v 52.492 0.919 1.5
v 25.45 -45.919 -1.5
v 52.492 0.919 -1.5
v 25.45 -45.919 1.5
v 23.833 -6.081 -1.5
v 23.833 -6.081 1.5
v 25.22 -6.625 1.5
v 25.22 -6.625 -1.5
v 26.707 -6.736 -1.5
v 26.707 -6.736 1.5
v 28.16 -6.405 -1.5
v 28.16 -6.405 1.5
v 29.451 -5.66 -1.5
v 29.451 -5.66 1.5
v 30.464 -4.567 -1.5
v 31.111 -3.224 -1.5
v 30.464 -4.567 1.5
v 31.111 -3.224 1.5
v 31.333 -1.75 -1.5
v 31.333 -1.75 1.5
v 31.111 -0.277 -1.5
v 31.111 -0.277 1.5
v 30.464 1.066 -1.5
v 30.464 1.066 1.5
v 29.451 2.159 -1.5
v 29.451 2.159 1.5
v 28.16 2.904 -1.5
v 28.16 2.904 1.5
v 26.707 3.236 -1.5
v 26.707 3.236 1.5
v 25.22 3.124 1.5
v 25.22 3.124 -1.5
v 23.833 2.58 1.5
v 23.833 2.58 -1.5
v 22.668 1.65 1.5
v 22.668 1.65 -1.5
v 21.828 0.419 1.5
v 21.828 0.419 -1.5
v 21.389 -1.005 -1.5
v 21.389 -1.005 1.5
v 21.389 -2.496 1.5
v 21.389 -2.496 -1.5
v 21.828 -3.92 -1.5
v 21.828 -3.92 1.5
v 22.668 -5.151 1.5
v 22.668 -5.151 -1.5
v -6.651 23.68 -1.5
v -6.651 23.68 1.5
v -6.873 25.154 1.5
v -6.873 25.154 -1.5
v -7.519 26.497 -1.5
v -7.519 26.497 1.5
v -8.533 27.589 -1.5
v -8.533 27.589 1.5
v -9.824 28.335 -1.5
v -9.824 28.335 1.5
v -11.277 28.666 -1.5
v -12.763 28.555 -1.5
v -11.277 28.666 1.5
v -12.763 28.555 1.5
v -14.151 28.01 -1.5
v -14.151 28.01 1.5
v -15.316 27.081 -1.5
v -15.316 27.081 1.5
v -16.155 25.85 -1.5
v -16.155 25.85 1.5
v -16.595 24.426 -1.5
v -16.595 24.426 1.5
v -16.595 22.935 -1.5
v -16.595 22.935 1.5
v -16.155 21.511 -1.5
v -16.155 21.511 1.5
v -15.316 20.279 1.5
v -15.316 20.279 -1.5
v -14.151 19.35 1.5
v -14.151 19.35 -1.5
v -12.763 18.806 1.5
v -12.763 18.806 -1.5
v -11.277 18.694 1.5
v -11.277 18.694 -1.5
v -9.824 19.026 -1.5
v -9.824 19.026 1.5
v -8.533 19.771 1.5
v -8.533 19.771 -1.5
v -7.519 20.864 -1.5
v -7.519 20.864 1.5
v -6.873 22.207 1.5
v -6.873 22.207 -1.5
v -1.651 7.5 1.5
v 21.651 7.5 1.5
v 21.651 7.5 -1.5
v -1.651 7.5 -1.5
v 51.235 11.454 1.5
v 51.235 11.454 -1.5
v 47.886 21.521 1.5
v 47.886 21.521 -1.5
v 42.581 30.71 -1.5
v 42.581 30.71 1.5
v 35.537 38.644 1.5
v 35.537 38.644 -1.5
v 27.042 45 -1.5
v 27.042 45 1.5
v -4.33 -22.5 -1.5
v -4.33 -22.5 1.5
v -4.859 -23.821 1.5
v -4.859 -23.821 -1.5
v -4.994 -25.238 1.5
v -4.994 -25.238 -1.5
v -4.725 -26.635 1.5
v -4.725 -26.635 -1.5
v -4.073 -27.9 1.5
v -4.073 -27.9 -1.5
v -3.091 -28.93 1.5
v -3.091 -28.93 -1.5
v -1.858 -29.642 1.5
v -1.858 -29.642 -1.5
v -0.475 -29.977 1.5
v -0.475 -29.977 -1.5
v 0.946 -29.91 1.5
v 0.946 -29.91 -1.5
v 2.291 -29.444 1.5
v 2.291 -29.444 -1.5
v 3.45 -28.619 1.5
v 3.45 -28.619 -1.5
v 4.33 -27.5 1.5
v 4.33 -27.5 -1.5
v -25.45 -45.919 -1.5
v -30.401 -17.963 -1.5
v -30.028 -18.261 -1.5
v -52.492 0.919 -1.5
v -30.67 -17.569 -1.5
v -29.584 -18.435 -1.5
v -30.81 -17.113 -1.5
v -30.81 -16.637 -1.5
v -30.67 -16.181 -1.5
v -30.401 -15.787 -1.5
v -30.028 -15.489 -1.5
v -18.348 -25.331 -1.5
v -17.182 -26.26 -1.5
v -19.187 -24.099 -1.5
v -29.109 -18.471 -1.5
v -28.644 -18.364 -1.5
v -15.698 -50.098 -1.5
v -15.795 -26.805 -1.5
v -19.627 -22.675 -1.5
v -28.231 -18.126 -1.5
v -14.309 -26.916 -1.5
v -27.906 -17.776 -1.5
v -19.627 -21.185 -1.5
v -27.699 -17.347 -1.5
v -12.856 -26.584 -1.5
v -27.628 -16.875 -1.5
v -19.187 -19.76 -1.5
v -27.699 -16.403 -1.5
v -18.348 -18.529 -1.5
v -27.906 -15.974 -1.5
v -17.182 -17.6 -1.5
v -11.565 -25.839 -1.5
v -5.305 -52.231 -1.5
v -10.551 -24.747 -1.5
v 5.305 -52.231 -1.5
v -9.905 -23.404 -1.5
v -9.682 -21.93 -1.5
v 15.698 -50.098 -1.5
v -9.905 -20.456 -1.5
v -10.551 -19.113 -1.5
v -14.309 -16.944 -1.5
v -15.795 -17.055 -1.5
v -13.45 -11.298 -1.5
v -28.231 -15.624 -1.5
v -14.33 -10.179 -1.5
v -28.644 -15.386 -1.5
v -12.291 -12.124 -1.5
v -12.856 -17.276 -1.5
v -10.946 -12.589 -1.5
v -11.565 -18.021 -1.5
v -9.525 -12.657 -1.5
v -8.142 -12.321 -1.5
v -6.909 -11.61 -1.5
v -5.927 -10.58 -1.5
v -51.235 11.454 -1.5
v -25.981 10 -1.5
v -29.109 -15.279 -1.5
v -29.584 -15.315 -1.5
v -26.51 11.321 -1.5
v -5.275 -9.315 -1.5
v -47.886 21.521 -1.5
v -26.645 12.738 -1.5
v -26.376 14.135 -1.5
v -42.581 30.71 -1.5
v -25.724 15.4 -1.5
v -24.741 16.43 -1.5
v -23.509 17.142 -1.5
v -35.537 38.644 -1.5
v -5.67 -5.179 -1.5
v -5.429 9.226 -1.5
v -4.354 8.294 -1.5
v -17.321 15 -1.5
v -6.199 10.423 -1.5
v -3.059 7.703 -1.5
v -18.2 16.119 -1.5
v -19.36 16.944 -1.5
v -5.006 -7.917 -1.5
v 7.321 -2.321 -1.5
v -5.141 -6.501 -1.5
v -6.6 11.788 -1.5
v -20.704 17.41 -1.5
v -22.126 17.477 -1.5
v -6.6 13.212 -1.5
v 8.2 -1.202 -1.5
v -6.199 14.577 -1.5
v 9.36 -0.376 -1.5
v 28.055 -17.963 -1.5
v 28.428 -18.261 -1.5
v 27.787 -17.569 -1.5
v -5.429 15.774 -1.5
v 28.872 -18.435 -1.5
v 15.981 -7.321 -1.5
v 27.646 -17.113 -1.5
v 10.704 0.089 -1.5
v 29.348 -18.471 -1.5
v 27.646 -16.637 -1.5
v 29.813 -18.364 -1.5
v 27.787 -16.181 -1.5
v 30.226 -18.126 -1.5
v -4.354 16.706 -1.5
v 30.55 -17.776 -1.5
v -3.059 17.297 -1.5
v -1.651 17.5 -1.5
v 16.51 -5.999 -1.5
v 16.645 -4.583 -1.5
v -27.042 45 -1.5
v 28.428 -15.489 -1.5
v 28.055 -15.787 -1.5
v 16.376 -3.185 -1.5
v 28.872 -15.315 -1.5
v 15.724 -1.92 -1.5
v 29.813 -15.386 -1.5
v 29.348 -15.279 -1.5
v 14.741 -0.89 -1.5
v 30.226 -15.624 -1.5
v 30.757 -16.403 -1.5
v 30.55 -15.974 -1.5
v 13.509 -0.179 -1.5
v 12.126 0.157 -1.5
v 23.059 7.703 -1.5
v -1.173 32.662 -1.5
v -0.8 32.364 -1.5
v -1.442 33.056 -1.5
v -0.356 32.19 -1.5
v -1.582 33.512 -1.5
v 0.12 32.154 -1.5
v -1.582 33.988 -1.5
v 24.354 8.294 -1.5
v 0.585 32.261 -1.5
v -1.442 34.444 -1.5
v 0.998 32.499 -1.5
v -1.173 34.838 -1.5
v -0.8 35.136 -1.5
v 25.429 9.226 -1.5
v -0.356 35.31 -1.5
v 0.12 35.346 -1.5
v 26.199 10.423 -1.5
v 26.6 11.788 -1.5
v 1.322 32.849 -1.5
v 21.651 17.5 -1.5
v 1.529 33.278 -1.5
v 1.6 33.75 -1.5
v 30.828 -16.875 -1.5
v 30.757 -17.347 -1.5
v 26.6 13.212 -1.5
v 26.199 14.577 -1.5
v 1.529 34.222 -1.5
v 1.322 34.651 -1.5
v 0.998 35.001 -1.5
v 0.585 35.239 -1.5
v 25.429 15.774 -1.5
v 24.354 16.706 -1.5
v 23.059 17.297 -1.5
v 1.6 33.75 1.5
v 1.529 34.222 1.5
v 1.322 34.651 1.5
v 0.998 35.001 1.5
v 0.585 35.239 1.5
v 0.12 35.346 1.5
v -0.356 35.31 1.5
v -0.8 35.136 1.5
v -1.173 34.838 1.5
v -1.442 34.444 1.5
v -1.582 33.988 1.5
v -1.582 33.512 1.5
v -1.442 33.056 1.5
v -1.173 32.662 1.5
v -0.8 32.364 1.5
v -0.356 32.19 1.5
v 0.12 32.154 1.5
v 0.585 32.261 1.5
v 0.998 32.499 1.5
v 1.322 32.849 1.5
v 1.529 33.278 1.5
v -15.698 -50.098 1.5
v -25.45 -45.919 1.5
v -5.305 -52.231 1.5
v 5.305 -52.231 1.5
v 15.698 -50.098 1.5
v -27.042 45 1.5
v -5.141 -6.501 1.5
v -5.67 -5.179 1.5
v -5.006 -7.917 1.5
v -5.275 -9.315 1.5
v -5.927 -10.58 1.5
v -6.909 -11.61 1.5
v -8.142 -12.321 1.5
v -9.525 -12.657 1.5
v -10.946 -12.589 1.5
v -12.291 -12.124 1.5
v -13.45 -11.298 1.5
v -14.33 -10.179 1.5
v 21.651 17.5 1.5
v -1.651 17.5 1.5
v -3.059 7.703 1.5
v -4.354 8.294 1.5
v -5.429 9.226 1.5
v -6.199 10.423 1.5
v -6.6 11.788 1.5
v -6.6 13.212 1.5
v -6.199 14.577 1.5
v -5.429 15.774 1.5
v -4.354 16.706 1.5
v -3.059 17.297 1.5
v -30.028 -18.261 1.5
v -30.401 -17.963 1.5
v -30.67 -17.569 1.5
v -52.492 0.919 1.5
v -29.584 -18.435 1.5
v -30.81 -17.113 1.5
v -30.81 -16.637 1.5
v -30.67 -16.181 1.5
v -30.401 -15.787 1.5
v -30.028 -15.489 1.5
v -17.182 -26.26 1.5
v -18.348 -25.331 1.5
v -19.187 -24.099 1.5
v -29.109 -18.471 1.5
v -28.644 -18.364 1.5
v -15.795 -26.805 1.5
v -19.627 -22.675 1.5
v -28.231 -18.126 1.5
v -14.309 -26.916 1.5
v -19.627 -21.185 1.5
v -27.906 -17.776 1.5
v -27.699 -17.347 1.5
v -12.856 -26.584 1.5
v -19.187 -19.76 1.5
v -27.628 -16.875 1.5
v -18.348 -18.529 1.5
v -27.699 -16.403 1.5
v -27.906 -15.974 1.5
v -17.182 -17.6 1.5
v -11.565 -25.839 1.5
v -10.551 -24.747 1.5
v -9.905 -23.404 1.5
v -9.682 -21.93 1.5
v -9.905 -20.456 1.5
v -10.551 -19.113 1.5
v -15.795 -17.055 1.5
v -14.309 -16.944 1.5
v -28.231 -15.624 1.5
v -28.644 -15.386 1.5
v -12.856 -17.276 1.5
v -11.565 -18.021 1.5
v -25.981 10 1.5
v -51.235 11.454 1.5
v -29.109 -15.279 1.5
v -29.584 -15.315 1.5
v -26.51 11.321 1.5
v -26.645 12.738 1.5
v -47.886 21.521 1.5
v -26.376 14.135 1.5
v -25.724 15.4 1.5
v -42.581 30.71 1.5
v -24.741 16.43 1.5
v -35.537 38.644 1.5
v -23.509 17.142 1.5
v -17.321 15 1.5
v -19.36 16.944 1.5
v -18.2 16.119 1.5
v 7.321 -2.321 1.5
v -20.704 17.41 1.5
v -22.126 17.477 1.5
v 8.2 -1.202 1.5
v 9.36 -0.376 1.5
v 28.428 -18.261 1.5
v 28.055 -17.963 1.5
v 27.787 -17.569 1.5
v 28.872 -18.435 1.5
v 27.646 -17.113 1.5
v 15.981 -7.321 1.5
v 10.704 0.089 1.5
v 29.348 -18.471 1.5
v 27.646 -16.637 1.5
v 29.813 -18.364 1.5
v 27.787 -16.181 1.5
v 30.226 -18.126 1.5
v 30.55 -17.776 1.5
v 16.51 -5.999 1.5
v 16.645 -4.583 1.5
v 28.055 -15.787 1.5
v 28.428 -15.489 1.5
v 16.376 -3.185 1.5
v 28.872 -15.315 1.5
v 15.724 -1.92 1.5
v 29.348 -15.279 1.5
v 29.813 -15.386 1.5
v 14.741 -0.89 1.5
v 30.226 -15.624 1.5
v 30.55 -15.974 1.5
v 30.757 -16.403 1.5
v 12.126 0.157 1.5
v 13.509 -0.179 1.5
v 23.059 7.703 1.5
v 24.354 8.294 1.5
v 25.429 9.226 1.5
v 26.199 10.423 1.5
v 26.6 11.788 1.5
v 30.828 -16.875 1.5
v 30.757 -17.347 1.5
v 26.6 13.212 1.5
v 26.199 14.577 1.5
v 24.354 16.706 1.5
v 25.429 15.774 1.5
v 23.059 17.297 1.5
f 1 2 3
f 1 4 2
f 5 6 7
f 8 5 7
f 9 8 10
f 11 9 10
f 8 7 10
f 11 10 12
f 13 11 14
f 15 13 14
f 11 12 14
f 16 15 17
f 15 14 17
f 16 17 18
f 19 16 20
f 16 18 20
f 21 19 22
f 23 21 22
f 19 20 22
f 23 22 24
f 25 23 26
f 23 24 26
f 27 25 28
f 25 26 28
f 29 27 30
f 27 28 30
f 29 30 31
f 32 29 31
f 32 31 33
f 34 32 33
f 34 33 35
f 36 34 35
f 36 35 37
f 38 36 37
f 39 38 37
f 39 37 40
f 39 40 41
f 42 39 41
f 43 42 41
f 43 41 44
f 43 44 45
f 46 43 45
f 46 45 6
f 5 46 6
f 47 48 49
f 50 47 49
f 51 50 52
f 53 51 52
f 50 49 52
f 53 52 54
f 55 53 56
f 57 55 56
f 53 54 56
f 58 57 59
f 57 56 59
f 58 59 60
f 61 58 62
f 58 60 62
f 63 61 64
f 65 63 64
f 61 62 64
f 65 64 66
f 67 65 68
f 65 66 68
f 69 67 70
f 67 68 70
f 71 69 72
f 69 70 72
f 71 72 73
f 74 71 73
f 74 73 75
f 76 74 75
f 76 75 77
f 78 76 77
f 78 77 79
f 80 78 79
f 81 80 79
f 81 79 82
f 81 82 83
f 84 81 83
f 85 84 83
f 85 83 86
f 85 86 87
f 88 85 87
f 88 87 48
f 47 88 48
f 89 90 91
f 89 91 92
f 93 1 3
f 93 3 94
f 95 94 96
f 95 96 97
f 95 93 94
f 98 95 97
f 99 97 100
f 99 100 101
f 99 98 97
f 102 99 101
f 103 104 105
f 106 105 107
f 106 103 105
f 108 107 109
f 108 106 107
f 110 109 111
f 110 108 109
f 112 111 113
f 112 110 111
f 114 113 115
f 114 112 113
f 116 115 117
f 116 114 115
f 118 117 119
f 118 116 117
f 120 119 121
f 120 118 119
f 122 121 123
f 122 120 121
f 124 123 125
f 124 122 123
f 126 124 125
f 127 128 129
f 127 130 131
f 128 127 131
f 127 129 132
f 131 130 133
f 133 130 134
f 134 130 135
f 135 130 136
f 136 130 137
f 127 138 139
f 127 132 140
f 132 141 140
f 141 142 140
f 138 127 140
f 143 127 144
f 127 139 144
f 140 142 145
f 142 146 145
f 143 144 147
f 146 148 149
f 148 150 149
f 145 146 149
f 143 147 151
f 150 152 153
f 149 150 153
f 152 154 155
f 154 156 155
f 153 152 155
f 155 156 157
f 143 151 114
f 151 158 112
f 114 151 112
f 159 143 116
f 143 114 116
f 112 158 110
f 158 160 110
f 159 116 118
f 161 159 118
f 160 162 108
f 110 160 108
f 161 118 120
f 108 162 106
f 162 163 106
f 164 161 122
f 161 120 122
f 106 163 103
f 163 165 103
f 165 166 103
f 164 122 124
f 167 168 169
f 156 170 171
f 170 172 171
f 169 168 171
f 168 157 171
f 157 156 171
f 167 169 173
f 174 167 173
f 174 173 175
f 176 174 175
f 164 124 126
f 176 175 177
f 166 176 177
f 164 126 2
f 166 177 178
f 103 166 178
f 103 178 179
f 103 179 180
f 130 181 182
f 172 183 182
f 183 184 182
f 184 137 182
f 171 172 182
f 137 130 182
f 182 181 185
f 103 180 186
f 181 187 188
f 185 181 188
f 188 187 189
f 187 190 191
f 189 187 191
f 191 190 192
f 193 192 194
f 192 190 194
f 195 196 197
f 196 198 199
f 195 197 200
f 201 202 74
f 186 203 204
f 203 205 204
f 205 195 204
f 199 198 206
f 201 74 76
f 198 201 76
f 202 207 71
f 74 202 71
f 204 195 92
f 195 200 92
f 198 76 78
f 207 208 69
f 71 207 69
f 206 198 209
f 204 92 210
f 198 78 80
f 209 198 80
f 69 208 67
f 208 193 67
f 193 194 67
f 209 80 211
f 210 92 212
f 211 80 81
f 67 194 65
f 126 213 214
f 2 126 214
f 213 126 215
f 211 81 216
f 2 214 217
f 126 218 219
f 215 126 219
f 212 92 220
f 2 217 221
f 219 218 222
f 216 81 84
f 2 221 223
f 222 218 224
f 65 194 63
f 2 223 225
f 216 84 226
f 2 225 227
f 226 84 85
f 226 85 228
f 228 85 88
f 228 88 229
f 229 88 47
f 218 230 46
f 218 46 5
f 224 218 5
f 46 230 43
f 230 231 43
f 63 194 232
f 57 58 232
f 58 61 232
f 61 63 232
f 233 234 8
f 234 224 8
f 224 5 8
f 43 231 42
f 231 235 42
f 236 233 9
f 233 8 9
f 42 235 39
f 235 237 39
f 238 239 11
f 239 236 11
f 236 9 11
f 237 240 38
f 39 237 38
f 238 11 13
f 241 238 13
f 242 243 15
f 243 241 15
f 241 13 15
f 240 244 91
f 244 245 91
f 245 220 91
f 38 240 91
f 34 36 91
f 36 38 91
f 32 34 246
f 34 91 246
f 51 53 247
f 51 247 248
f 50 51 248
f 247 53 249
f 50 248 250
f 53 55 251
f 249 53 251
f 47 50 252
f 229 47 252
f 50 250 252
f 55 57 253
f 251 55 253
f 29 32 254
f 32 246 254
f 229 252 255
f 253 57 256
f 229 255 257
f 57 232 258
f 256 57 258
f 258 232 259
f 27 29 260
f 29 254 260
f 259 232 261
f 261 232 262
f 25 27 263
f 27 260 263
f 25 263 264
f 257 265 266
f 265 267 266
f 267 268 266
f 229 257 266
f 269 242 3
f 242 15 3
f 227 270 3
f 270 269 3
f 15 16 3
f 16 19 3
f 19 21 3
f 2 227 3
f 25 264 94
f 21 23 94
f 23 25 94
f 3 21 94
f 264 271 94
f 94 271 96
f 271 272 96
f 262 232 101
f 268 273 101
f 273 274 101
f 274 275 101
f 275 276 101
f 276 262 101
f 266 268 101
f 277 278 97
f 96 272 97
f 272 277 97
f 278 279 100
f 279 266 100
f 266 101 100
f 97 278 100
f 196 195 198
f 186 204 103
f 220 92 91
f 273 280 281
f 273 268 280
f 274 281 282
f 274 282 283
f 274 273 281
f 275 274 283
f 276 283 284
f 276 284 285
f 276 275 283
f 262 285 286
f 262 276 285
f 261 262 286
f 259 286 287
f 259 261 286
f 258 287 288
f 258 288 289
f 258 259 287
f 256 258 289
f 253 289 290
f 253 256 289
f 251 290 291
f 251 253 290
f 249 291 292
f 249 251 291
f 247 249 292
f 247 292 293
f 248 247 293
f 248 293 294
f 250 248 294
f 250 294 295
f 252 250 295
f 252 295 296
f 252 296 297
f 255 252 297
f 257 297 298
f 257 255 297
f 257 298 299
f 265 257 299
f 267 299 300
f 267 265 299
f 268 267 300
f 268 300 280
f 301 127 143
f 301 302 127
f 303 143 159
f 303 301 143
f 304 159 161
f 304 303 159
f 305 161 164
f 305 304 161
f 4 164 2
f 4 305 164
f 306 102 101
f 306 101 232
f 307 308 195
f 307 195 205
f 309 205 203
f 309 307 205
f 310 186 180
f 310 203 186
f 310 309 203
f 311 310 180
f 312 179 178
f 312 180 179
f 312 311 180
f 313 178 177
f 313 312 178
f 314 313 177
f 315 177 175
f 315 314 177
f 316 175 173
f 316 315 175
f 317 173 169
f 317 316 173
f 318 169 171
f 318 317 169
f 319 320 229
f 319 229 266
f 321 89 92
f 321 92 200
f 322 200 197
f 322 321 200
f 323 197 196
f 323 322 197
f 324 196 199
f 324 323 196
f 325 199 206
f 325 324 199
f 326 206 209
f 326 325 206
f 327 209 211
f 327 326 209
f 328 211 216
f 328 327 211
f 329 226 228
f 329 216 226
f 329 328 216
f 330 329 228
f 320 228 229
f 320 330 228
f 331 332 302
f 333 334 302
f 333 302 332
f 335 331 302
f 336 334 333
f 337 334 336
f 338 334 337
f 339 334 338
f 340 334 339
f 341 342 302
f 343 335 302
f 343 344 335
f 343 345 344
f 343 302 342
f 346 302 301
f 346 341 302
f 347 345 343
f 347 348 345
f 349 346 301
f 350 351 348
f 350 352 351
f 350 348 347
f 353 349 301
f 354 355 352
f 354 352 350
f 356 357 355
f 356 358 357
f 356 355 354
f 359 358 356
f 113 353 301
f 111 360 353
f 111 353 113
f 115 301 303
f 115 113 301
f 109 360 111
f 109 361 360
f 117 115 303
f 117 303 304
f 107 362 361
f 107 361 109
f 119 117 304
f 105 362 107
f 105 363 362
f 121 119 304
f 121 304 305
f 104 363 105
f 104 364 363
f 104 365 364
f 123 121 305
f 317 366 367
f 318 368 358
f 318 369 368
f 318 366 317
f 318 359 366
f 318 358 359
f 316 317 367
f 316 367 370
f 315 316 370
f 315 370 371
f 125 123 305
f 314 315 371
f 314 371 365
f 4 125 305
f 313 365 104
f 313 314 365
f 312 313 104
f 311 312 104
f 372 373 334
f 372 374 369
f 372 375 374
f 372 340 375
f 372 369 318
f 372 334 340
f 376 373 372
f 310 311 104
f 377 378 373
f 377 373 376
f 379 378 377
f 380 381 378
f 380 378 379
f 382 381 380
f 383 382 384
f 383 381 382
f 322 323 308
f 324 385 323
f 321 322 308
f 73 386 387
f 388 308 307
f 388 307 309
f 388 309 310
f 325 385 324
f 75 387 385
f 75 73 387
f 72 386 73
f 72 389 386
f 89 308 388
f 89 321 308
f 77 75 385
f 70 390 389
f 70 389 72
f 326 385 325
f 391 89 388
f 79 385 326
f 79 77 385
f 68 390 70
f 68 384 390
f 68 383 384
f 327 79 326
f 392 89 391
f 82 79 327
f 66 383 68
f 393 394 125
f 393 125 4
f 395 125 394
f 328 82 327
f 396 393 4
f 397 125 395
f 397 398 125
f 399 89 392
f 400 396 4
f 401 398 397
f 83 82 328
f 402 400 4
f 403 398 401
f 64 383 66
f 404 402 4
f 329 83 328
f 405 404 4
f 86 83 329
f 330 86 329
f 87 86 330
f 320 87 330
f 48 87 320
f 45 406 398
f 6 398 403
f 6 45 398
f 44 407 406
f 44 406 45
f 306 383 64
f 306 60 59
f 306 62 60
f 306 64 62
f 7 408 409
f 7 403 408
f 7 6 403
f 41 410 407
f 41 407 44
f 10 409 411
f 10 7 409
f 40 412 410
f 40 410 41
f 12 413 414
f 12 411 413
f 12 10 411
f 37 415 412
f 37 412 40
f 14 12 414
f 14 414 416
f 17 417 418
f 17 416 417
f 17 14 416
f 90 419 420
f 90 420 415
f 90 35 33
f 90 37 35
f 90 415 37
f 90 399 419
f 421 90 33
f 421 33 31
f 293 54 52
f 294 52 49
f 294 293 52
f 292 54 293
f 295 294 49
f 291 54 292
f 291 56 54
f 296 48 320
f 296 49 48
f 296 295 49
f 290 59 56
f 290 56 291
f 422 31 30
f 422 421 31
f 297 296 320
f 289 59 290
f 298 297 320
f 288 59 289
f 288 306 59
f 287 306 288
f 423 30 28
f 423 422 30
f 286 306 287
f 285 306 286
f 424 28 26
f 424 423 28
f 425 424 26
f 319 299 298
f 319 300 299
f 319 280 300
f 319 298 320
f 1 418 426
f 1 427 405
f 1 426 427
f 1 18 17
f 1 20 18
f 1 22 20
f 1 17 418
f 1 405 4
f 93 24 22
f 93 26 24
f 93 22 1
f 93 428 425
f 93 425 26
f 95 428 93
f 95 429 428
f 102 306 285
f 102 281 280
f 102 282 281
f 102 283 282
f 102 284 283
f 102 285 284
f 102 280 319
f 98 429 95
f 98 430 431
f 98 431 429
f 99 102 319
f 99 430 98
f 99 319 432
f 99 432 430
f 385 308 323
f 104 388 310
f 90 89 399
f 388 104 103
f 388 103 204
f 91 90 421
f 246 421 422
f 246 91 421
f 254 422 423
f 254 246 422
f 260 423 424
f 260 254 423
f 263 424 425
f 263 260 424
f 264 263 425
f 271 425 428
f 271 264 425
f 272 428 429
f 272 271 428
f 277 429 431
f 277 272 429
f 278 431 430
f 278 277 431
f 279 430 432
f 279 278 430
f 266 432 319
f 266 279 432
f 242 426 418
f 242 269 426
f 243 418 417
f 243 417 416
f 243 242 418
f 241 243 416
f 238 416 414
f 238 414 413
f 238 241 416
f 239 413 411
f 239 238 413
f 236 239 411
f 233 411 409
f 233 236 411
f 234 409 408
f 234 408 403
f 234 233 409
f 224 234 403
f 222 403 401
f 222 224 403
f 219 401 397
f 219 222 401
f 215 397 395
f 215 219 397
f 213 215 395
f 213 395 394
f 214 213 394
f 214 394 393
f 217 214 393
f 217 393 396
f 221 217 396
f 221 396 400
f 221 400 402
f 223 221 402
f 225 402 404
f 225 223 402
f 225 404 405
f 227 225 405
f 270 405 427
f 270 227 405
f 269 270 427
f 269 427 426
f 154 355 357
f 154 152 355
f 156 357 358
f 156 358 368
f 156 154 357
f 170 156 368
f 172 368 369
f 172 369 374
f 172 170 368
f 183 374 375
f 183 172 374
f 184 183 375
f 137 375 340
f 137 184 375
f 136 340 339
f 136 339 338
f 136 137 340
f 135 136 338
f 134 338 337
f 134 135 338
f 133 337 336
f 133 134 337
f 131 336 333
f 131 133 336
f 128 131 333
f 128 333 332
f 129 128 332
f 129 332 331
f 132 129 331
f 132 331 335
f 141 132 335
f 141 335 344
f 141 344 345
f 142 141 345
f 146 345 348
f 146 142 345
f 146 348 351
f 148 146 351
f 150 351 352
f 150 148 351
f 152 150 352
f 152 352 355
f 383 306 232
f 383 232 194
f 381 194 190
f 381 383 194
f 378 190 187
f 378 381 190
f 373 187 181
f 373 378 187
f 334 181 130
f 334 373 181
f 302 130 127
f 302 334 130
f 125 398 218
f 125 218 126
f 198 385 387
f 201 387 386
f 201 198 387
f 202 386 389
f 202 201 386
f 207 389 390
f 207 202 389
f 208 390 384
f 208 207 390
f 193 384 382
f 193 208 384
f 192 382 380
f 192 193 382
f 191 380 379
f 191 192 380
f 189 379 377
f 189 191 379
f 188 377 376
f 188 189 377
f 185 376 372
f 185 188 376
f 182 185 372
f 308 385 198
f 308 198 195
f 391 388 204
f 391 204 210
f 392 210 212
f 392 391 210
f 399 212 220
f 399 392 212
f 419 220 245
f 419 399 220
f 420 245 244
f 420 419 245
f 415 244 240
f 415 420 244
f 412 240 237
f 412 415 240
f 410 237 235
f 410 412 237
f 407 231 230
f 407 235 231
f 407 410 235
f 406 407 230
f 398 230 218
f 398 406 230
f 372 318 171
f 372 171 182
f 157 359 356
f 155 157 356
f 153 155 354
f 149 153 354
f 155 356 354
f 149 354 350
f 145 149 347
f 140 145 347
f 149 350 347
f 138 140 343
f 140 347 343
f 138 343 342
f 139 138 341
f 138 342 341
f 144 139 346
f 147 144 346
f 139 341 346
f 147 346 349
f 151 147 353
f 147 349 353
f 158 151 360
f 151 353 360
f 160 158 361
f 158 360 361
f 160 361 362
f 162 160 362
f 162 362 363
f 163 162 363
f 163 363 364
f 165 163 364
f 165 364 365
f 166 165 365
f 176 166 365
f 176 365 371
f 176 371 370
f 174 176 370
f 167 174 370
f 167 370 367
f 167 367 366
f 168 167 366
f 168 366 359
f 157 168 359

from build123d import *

# Parameters (mm, degrees)
SKETCH_1_R               = 1.6
SKETCH_1_R_2             = 5
EXTRUDE_1_DEPTH          = 1.5
CUT_EXTRUDE_1_DEPTH      = 75.301116494
PATTERN_CIRCULAR_1_COUNT = 3
SKETCH_3_R               = 5
CUT_EXTRUDE_3_DEPTH      = 75.301116494
PATTERN_CIRCULAR_3_COUNT = 3


with BuildPart() as part:
    # 草图1 → 凸台-拉伸1 (new, symmetric)
    with BuildSketch(Plane.XY):
        with BuildLine():
            Line((25.450325887, -45.918742494), (52.491960453, 0.918742494))
            ThreePointArc((52.491960453, 0.918742494), (45.466333699, 26.25), (27.041634566, 45))
            Line((27.041634566, 45), (-27.041634566, 45))
            ThreePointArc((-27.041634566, 45), (-45.466333699, 26.25), (-52.491960453, 0.918742494))
            Line((-52.491960453, 0.918742494), (-25.450325887, -45.918742494))
            ThreePointArc((-25.450325887, -45.918742494), (0, -52.5), (25.450325887, -45.918742494))
        make_face()
        with Locations((0, 33.75)):
            Circle(SKETCH_1_R, mode=Mode.SUBTRACT)
        with Locations((29.228357378, -16.875)):
            Circle(SKETCH_1_R, mode=Mode.SUBTRACT)
        with Locations((-29.228357378, -16.875)):
            Circle(SKETCH_1_R, mode=Mode.SUBTRACT)
        with Locations((0, -25)):
            Circle(SKETCH_1_R_2, mode=Mode.SUBTRACT)
        with Locations((-21.650635095, 12.5)):
            Circle(SKETCH_1_R_2, mode=Mode.SUBTRACT)
        with Locations((21.650635095, 12.5)):
            Circle(SKETCH_1_R_2, mode=Mode.SUBTRACT)
    extrude(amount=EXTRUDE_1_DEPTH, both=True)

    # 草图2 → 切除-拉伸1 (cut, through all)
    with BuildSketch(Plane.XY.offset(1.5)):
        with BuildLine():
            Line((-17.320508076, 15), (-5.669872981, -5.179491924))
            ThreePointArc((-5.669872981, -5.179491924), (-7.5, -12.009618943), (-14.330127019, -10.179491924))
            Line((-14.330127019, -10.179491924), (-25.980762114, 10))
            ThreePointArc((-25.980762114, 10), (-24.150635095, 16.830127019), (-17.320508076, 15))
        make_face()
    cut_extrude_1 = extrude(amount=-CUT_EXTRUDE_1_DEPTH, mode=Mode.SUBTRACT)

    # 阵列(圆周)1: 切除-拉伸1 ×3 about axis
    pattern_circular_1_axis = Axis((0, 0, 0), (0, 0, 1))
    for i in range(1, PATTERN_CIRCULAR_1_COUNT):
        add(cut_extrude_1.rotate(pattern_circular_1_axis, i * 360 / PATTERN_CIRCULAR_1_COUNT), mode=Mode.SUBTRACT)

    # 草图3 → 切除-拉伸3 (cut, through all)
    with BuildSketch(Plane.XY.offset(1.5)):
        with Locations((-11.650635095, 23.680339887)):
            Circle(SKETCH_3_R)
    cut_extrude_3 = extrude(amount=-CUT_EXTRUDE_3_DEPTH, mode=Mode.SUBTRACT)

    # 阵列(圆周)3: 切除-拉伸3 ×3 about axis
    pattern_circular_3_axis = Axis((0, 0, 0), (0, 0, 1))
    for i in range(1, PATTERN_CIRCULAR_3_COUNT):
        add(cut_extrude_3.rotate(pattern_circular_3_axis, i * 360 / PATTERN_CIRCULAR_3_COUNT), mode=Mode.SUBTRACT)


solid = part.part
